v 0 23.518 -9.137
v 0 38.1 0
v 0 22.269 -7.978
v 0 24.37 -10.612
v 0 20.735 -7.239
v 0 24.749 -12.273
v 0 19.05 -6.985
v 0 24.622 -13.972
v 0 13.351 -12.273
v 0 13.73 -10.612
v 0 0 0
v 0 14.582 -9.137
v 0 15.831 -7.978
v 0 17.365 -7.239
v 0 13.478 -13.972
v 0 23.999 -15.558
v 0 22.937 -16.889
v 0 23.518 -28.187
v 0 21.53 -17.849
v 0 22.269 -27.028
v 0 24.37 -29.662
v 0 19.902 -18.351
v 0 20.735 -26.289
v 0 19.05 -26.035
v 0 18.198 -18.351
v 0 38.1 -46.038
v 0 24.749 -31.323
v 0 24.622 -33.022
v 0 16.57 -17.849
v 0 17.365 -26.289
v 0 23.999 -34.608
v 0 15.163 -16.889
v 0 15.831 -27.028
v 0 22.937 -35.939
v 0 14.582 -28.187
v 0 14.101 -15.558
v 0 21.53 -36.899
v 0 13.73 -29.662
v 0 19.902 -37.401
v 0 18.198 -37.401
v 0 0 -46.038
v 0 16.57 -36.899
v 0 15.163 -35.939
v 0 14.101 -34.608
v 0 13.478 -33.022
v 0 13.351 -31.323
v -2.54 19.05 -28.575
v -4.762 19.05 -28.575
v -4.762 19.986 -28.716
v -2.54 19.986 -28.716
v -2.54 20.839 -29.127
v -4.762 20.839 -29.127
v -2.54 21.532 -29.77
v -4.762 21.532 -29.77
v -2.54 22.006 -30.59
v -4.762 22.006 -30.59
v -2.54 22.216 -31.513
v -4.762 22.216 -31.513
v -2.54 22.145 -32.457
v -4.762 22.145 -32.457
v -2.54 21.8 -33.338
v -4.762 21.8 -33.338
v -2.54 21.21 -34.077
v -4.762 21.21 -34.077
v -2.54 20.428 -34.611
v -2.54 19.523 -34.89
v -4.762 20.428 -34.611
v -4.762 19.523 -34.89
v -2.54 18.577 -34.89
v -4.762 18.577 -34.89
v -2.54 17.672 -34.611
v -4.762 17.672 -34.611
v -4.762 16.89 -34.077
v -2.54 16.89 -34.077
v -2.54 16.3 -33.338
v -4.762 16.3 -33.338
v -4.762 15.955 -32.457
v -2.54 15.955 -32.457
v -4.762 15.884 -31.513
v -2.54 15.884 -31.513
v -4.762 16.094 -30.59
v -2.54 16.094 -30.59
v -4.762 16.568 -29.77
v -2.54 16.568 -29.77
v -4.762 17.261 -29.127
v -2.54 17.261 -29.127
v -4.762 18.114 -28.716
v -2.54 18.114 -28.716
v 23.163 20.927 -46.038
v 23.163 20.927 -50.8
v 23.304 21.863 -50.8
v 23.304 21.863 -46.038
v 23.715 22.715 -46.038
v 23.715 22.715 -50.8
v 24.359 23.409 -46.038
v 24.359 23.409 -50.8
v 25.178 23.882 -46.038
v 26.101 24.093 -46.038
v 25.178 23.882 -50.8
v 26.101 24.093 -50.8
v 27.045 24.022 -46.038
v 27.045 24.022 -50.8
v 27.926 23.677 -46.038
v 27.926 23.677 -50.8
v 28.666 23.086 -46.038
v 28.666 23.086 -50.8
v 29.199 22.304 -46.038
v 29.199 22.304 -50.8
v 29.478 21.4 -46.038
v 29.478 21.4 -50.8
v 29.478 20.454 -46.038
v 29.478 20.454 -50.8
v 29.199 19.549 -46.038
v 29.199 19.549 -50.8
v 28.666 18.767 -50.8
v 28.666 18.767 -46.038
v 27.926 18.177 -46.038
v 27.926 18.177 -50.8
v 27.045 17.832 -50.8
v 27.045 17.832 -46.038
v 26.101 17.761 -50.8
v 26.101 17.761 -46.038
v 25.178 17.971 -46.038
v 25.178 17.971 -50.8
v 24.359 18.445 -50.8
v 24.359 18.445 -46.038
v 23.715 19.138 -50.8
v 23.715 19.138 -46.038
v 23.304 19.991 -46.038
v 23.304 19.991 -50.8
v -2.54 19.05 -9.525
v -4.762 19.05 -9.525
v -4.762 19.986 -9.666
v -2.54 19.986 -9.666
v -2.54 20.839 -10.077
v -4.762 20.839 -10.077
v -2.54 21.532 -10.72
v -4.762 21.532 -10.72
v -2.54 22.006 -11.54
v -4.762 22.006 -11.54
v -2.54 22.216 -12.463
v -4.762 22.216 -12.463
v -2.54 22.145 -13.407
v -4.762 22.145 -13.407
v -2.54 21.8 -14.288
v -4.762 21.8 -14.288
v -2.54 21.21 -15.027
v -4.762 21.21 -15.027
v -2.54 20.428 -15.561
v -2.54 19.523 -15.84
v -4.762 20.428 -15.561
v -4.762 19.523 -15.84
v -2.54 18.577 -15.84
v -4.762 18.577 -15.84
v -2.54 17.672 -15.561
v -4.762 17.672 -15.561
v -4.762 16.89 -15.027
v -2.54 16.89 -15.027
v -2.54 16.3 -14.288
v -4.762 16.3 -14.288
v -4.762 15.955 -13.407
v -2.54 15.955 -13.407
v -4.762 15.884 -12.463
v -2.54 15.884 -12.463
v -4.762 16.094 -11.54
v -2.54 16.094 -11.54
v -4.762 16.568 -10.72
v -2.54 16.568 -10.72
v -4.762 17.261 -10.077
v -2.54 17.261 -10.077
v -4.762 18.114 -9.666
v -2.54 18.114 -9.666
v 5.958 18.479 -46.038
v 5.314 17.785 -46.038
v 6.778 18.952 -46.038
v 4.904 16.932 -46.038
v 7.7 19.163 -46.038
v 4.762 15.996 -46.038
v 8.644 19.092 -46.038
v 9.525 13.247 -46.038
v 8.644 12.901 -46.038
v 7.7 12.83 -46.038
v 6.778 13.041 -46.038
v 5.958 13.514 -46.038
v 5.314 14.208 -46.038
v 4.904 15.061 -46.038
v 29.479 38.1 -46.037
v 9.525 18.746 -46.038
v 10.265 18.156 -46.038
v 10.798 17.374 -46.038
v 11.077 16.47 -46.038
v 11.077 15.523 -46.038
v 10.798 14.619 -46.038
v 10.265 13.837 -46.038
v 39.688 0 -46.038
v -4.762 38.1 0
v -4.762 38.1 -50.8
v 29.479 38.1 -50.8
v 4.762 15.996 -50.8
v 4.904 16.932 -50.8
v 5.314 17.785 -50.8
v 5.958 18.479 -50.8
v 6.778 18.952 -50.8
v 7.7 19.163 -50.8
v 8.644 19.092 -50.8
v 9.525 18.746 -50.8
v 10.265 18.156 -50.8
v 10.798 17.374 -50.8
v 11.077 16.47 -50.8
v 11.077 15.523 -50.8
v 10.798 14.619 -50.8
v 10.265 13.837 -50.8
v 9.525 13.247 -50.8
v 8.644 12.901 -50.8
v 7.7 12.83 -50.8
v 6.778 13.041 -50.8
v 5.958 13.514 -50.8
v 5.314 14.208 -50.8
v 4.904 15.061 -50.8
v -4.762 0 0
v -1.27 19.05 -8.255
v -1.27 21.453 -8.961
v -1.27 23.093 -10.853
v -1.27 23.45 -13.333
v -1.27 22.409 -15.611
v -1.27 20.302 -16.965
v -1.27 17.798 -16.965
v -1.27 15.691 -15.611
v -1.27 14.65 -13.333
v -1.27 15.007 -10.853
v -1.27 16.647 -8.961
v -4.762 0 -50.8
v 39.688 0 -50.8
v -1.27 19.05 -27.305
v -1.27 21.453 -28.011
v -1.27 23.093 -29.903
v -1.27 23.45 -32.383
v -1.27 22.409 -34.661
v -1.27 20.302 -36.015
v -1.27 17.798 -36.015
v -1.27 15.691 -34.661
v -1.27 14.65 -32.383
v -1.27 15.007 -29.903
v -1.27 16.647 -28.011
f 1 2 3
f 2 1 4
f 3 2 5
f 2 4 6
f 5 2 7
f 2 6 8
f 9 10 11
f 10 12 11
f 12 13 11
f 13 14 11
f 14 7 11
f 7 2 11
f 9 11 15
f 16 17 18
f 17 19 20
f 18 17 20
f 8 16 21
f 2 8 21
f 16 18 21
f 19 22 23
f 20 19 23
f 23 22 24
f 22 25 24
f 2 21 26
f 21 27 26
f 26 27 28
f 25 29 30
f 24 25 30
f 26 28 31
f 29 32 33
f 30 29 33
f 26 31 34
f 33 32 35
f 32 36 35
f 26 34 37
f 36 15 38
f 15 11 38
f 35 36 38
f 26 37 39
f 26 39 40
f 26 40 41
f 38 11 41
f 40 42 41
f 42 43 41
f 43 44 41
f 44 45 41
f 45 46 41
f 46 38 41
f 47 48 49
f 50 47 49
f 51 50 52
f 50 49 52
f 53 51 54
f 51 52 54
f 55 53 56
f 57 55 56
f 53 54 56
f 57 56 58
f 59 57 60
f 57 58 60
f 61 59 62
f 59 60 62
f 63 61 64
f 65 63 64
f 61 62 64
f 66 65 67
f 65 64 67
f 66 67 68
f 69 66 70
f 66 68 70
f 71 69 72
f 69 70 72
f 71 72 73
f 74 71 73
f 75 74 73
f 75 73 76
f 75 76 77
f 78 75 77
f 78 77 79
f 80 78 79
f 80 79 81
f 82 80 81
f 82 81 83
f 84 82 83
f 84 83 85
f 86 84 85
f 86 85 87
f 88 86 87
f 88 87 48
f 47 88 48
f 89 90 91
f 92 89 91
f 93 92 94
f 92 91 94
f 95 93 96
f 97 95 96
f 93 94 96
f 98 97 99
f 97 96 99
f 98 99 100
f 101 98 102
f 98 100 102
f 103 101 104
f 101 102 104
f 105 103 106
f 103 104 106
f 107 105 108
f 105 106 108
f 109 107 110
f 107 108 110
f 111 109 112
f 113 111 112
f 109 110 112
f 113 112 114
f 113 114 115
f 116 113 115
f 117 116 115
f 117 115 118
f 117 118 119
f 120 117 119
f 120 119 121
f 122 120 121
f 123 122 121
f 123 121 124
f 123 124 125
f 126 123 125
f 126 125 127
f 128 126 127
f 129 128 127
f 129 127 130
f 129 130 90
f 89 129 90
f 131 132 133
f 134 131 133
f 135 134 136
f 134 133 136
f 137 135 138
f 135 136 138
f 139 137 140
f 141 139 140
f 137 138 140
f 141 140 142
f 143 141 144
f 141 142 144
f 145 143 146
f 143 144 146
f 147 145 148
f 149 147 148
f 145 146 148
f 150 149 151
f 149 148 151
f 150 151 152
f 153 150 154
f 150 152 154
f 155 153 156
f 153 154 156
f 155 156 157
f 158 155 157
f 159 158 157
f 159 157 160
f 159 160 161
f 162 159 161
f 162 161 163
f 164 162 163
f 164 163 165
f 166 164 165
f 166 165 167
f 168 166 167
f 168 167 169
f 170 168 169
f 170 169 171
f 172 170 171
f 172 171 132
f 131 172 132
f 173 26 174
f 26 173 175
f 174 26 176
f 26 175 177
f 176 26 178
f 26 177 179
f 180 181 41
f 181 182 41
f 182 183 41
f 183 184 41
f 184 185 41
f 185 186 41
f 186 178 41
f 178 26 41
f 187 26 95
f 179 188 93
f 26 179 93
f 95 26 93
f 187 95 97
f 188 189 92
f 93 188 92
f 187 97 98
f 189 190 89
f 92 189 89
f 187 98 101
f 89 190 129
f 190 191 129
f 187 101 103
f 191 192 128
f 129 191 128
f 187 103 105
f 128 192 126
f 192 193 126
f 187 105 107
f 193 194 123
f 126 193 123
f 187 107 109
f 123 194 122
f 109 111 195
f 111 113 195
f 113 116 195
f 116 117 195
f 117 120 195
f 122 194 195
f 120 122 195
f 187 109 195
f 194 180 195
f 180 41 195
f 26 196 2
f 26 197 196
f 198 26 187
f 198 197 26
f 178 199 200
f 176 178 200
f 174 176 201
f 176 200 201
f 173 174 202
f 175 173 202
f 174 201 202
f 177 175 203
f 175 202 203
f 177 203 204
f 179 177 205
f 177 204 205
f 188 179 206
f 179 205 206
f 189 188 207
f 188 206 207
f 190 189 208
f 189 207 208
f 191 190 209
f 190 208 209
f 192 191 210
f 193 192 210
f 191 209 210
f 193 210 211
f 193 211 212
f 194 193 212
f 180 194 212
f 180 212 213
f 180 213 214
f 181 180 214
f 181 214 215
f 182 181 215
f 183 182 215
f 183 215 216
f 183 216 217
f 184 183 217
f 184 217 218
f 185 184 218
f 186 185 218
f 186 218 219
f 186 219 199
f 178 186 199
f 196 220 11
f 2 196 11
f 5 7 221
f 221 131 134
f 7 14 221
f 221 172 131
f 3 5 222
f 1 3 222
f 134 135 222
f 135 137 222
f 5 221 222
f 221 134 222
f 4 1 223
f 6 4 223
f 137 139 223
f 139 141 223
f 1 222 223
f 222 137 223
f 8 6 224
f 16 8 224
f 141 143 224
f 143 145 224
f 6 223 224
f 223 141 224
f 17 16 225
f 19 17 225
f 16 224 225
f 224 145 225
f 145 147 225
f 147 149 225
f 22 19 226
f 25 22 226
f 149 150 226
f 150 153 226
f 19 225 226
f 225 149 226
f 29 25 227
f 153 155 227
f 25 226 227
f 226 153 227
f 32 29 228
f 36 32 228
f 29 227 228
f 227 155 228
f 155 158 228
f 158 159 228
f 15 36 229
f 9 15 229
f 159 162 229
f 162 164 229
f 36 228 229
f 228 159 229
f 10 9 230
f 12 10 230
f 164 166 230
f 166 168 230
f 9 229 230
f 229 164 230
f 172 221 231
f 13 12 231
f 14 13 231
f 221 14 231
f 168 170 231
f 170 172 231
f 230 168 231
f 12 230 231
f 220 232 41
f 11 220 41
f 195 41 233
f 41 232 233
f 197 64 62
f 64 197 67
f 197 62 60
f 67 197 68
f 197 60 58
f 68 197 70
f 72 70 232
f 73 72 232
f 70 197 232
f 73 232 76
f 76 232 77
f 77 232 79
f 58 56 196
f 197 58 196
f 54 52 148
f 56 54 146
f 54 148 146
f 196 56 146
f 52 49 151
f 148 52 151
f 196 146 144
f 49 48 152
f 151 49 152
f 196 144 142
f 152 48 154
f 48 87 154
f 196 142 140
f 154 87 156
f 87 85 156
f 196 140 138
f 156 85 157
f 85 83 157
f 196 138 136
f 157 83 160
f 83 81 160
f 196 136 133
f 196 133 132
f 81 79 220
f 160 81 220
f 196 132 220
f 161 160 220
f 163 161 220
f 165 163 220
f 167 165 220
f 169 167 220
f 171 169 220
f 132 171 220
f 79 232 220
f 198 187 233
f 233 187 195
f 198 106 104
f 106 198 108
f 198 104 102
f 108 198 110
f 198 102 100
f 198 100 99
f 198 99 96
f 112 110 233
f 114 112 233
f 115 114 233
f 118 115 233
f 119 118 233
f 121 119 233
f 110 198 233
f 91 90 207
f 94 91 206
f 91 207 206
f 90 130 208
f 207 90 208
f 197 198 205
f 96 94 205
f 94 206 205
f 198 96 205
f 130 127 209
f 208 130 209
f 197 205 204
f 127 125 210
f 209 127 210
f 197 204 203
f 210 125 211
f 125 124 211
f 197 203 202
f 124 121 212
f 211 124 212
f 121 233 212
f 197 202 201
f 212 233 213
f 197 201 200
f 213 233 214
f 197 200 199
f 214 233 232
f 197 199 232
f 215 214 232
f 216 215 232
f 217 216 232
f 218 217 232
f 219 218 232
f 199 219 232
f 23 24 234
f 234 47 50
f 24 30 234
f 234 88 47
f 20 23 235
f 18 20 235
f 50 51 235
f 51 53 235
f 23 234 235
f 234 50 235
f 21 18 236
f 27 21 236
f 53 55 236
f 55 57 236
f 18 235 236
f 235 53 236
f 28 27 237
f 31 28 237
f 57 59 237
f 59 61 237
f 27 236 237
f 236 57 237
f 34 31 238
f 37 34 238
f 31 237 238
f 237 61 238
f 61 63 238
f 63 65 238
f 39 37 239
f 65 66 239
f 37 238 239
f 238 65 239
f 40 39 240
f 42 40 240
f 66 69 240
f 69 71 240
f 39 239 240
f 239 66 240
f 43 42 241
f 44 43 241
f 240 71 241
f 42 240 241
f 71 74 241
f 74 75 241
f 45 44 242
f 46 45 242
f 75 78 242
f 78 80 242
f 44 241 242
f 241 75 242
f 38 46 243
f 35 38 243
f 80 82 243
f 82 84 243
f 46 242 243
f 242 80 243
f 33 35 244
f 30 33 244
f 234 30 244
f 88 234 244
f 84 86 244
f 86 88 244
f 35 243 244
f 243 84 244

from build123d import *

# Parameters (mm, degrees)
BOSS_EXTRUDE1_DEPTH     = 38.1
SKETCH2_R               = 3.175
CUT_EXTRUDE1_DEPTH      = 38.1
CUT_EXTRUDE3_REACH      = 79.512
SKETCH3_R               = 3.175
CUT_EXTRUDE4_DEPTH      = 75.882225236
CUT_EXTRUDE4_DEPTH_BACK = 75.882225236
CHAMFER1_SIZE           = 2.54


with BuildPart() as part:
    # Sketch1 → Boss-Extrude1 (new body)
    with BuildSketch(Plane(origin=(0, 0, 0), x_dir=(1, 0, 0), z_dir=(0, 1, 0))):
        Polygon((0, 0), (0, 46.0375), (39.6875, 46.0375), (39.6875, 50.8), (-4.7625, 50.8), (-4.7625, 0), align=None)
    extrude(amount=BOSS_EXTRUDE1_DEPTH)

    # Sketch2 → Cut-Extrude1 (cut)
    with BuildSketch(Plane(origin=(0, 0, -50.8), x_dir=(-1, 0, 0), z_dir=(0, 0, -1))):
        with Locations((-26.338386991, 20.92691832)):
            Circle(SKETCH2_R)
        with Locations((-7.9375, 15.996415511)):
            Circle(SKETCH2_R)
    extrude(amount=-CUT_EXTRUDE1_DEPTH, mode=Mode.SUBTRACT)

    # Sketch3 → Cut-Extrude3 (cut, up to next)
    with BuildSketch(Plane.ZY.offset(4.7625), mode=Mode.PRIVATE) as cut_extrude3_sk1:
        with Locations((-12.7, 19.05)):
            Circle(SKETCH3_R)
    cut_extrude3_tool1 = extrude(cut_extrude3_sk1.sketch, amount=-CUT_EXTRUDE3_REACH, mode=Mode.PRIVATE) & part.part
    # Sketch3 → Cut-Extrude3 (cut, up to next)
    with BuildSketch(Plane.ZY.offset(4.7625), mode=Mode.PRIVATE) as cut_extrude3_sk2:
        with Locations((-31.75, 19.05)):
            Circle(SKETCH3_R)
    cut_extrude3_tool2 = extrude(cut_extrude3_sk2.sketch, amount=-CUT_EXTRUDE3_REACH, mode=Mode.PRIVATE) & part.part
    add(cut_extrude3_tool1.solids().sort_by_distance((-4.7625, 19.05, -12.7))[0], mode=Mode.SUBTRACT)
    add(cut_extrude3_tool2.solids().sort_by_distance((-4.7625, 19.05, -31.75))[0], mode=Mode.SUBTRACT)

    # Sketch4 → Cut-Extrude4 (cut, two sides: drawn at the far end of the back side and taken through both)
    with BuildSketch(Plane(origin=(0, 0, -50.8), x_dir=(-1, 0, 0), z_dir=(0, 0, -1)).offset(-CUT_EXTRUDE4_DEPTH_BACK)):
        Polygon((3.41421458, 160.857788706), (-29.478635768, 38.1), (-39.6875, 0), (-72.580350349, -122.757788706), (-318.095927761, -56.972088009), (-242.101362833, 226.643489404), align=None)
    extrude(amount=CUT_EXTRUDE4_DEPTH + CUT_EXTRUDE4_DEPTH_BACK, mode=Mode.SUBTRACT)

    # Chamfer1
    chamfer1_edges = [part.edges().sort_by_distance(p)[0] for p in [
        (0, 19.05, -15.875),
        (0, 19.05, -34.925),
    ]]
    chamfer(chamfer1_edges, length=CHAMFER1_SIZE)


solid = part.part
